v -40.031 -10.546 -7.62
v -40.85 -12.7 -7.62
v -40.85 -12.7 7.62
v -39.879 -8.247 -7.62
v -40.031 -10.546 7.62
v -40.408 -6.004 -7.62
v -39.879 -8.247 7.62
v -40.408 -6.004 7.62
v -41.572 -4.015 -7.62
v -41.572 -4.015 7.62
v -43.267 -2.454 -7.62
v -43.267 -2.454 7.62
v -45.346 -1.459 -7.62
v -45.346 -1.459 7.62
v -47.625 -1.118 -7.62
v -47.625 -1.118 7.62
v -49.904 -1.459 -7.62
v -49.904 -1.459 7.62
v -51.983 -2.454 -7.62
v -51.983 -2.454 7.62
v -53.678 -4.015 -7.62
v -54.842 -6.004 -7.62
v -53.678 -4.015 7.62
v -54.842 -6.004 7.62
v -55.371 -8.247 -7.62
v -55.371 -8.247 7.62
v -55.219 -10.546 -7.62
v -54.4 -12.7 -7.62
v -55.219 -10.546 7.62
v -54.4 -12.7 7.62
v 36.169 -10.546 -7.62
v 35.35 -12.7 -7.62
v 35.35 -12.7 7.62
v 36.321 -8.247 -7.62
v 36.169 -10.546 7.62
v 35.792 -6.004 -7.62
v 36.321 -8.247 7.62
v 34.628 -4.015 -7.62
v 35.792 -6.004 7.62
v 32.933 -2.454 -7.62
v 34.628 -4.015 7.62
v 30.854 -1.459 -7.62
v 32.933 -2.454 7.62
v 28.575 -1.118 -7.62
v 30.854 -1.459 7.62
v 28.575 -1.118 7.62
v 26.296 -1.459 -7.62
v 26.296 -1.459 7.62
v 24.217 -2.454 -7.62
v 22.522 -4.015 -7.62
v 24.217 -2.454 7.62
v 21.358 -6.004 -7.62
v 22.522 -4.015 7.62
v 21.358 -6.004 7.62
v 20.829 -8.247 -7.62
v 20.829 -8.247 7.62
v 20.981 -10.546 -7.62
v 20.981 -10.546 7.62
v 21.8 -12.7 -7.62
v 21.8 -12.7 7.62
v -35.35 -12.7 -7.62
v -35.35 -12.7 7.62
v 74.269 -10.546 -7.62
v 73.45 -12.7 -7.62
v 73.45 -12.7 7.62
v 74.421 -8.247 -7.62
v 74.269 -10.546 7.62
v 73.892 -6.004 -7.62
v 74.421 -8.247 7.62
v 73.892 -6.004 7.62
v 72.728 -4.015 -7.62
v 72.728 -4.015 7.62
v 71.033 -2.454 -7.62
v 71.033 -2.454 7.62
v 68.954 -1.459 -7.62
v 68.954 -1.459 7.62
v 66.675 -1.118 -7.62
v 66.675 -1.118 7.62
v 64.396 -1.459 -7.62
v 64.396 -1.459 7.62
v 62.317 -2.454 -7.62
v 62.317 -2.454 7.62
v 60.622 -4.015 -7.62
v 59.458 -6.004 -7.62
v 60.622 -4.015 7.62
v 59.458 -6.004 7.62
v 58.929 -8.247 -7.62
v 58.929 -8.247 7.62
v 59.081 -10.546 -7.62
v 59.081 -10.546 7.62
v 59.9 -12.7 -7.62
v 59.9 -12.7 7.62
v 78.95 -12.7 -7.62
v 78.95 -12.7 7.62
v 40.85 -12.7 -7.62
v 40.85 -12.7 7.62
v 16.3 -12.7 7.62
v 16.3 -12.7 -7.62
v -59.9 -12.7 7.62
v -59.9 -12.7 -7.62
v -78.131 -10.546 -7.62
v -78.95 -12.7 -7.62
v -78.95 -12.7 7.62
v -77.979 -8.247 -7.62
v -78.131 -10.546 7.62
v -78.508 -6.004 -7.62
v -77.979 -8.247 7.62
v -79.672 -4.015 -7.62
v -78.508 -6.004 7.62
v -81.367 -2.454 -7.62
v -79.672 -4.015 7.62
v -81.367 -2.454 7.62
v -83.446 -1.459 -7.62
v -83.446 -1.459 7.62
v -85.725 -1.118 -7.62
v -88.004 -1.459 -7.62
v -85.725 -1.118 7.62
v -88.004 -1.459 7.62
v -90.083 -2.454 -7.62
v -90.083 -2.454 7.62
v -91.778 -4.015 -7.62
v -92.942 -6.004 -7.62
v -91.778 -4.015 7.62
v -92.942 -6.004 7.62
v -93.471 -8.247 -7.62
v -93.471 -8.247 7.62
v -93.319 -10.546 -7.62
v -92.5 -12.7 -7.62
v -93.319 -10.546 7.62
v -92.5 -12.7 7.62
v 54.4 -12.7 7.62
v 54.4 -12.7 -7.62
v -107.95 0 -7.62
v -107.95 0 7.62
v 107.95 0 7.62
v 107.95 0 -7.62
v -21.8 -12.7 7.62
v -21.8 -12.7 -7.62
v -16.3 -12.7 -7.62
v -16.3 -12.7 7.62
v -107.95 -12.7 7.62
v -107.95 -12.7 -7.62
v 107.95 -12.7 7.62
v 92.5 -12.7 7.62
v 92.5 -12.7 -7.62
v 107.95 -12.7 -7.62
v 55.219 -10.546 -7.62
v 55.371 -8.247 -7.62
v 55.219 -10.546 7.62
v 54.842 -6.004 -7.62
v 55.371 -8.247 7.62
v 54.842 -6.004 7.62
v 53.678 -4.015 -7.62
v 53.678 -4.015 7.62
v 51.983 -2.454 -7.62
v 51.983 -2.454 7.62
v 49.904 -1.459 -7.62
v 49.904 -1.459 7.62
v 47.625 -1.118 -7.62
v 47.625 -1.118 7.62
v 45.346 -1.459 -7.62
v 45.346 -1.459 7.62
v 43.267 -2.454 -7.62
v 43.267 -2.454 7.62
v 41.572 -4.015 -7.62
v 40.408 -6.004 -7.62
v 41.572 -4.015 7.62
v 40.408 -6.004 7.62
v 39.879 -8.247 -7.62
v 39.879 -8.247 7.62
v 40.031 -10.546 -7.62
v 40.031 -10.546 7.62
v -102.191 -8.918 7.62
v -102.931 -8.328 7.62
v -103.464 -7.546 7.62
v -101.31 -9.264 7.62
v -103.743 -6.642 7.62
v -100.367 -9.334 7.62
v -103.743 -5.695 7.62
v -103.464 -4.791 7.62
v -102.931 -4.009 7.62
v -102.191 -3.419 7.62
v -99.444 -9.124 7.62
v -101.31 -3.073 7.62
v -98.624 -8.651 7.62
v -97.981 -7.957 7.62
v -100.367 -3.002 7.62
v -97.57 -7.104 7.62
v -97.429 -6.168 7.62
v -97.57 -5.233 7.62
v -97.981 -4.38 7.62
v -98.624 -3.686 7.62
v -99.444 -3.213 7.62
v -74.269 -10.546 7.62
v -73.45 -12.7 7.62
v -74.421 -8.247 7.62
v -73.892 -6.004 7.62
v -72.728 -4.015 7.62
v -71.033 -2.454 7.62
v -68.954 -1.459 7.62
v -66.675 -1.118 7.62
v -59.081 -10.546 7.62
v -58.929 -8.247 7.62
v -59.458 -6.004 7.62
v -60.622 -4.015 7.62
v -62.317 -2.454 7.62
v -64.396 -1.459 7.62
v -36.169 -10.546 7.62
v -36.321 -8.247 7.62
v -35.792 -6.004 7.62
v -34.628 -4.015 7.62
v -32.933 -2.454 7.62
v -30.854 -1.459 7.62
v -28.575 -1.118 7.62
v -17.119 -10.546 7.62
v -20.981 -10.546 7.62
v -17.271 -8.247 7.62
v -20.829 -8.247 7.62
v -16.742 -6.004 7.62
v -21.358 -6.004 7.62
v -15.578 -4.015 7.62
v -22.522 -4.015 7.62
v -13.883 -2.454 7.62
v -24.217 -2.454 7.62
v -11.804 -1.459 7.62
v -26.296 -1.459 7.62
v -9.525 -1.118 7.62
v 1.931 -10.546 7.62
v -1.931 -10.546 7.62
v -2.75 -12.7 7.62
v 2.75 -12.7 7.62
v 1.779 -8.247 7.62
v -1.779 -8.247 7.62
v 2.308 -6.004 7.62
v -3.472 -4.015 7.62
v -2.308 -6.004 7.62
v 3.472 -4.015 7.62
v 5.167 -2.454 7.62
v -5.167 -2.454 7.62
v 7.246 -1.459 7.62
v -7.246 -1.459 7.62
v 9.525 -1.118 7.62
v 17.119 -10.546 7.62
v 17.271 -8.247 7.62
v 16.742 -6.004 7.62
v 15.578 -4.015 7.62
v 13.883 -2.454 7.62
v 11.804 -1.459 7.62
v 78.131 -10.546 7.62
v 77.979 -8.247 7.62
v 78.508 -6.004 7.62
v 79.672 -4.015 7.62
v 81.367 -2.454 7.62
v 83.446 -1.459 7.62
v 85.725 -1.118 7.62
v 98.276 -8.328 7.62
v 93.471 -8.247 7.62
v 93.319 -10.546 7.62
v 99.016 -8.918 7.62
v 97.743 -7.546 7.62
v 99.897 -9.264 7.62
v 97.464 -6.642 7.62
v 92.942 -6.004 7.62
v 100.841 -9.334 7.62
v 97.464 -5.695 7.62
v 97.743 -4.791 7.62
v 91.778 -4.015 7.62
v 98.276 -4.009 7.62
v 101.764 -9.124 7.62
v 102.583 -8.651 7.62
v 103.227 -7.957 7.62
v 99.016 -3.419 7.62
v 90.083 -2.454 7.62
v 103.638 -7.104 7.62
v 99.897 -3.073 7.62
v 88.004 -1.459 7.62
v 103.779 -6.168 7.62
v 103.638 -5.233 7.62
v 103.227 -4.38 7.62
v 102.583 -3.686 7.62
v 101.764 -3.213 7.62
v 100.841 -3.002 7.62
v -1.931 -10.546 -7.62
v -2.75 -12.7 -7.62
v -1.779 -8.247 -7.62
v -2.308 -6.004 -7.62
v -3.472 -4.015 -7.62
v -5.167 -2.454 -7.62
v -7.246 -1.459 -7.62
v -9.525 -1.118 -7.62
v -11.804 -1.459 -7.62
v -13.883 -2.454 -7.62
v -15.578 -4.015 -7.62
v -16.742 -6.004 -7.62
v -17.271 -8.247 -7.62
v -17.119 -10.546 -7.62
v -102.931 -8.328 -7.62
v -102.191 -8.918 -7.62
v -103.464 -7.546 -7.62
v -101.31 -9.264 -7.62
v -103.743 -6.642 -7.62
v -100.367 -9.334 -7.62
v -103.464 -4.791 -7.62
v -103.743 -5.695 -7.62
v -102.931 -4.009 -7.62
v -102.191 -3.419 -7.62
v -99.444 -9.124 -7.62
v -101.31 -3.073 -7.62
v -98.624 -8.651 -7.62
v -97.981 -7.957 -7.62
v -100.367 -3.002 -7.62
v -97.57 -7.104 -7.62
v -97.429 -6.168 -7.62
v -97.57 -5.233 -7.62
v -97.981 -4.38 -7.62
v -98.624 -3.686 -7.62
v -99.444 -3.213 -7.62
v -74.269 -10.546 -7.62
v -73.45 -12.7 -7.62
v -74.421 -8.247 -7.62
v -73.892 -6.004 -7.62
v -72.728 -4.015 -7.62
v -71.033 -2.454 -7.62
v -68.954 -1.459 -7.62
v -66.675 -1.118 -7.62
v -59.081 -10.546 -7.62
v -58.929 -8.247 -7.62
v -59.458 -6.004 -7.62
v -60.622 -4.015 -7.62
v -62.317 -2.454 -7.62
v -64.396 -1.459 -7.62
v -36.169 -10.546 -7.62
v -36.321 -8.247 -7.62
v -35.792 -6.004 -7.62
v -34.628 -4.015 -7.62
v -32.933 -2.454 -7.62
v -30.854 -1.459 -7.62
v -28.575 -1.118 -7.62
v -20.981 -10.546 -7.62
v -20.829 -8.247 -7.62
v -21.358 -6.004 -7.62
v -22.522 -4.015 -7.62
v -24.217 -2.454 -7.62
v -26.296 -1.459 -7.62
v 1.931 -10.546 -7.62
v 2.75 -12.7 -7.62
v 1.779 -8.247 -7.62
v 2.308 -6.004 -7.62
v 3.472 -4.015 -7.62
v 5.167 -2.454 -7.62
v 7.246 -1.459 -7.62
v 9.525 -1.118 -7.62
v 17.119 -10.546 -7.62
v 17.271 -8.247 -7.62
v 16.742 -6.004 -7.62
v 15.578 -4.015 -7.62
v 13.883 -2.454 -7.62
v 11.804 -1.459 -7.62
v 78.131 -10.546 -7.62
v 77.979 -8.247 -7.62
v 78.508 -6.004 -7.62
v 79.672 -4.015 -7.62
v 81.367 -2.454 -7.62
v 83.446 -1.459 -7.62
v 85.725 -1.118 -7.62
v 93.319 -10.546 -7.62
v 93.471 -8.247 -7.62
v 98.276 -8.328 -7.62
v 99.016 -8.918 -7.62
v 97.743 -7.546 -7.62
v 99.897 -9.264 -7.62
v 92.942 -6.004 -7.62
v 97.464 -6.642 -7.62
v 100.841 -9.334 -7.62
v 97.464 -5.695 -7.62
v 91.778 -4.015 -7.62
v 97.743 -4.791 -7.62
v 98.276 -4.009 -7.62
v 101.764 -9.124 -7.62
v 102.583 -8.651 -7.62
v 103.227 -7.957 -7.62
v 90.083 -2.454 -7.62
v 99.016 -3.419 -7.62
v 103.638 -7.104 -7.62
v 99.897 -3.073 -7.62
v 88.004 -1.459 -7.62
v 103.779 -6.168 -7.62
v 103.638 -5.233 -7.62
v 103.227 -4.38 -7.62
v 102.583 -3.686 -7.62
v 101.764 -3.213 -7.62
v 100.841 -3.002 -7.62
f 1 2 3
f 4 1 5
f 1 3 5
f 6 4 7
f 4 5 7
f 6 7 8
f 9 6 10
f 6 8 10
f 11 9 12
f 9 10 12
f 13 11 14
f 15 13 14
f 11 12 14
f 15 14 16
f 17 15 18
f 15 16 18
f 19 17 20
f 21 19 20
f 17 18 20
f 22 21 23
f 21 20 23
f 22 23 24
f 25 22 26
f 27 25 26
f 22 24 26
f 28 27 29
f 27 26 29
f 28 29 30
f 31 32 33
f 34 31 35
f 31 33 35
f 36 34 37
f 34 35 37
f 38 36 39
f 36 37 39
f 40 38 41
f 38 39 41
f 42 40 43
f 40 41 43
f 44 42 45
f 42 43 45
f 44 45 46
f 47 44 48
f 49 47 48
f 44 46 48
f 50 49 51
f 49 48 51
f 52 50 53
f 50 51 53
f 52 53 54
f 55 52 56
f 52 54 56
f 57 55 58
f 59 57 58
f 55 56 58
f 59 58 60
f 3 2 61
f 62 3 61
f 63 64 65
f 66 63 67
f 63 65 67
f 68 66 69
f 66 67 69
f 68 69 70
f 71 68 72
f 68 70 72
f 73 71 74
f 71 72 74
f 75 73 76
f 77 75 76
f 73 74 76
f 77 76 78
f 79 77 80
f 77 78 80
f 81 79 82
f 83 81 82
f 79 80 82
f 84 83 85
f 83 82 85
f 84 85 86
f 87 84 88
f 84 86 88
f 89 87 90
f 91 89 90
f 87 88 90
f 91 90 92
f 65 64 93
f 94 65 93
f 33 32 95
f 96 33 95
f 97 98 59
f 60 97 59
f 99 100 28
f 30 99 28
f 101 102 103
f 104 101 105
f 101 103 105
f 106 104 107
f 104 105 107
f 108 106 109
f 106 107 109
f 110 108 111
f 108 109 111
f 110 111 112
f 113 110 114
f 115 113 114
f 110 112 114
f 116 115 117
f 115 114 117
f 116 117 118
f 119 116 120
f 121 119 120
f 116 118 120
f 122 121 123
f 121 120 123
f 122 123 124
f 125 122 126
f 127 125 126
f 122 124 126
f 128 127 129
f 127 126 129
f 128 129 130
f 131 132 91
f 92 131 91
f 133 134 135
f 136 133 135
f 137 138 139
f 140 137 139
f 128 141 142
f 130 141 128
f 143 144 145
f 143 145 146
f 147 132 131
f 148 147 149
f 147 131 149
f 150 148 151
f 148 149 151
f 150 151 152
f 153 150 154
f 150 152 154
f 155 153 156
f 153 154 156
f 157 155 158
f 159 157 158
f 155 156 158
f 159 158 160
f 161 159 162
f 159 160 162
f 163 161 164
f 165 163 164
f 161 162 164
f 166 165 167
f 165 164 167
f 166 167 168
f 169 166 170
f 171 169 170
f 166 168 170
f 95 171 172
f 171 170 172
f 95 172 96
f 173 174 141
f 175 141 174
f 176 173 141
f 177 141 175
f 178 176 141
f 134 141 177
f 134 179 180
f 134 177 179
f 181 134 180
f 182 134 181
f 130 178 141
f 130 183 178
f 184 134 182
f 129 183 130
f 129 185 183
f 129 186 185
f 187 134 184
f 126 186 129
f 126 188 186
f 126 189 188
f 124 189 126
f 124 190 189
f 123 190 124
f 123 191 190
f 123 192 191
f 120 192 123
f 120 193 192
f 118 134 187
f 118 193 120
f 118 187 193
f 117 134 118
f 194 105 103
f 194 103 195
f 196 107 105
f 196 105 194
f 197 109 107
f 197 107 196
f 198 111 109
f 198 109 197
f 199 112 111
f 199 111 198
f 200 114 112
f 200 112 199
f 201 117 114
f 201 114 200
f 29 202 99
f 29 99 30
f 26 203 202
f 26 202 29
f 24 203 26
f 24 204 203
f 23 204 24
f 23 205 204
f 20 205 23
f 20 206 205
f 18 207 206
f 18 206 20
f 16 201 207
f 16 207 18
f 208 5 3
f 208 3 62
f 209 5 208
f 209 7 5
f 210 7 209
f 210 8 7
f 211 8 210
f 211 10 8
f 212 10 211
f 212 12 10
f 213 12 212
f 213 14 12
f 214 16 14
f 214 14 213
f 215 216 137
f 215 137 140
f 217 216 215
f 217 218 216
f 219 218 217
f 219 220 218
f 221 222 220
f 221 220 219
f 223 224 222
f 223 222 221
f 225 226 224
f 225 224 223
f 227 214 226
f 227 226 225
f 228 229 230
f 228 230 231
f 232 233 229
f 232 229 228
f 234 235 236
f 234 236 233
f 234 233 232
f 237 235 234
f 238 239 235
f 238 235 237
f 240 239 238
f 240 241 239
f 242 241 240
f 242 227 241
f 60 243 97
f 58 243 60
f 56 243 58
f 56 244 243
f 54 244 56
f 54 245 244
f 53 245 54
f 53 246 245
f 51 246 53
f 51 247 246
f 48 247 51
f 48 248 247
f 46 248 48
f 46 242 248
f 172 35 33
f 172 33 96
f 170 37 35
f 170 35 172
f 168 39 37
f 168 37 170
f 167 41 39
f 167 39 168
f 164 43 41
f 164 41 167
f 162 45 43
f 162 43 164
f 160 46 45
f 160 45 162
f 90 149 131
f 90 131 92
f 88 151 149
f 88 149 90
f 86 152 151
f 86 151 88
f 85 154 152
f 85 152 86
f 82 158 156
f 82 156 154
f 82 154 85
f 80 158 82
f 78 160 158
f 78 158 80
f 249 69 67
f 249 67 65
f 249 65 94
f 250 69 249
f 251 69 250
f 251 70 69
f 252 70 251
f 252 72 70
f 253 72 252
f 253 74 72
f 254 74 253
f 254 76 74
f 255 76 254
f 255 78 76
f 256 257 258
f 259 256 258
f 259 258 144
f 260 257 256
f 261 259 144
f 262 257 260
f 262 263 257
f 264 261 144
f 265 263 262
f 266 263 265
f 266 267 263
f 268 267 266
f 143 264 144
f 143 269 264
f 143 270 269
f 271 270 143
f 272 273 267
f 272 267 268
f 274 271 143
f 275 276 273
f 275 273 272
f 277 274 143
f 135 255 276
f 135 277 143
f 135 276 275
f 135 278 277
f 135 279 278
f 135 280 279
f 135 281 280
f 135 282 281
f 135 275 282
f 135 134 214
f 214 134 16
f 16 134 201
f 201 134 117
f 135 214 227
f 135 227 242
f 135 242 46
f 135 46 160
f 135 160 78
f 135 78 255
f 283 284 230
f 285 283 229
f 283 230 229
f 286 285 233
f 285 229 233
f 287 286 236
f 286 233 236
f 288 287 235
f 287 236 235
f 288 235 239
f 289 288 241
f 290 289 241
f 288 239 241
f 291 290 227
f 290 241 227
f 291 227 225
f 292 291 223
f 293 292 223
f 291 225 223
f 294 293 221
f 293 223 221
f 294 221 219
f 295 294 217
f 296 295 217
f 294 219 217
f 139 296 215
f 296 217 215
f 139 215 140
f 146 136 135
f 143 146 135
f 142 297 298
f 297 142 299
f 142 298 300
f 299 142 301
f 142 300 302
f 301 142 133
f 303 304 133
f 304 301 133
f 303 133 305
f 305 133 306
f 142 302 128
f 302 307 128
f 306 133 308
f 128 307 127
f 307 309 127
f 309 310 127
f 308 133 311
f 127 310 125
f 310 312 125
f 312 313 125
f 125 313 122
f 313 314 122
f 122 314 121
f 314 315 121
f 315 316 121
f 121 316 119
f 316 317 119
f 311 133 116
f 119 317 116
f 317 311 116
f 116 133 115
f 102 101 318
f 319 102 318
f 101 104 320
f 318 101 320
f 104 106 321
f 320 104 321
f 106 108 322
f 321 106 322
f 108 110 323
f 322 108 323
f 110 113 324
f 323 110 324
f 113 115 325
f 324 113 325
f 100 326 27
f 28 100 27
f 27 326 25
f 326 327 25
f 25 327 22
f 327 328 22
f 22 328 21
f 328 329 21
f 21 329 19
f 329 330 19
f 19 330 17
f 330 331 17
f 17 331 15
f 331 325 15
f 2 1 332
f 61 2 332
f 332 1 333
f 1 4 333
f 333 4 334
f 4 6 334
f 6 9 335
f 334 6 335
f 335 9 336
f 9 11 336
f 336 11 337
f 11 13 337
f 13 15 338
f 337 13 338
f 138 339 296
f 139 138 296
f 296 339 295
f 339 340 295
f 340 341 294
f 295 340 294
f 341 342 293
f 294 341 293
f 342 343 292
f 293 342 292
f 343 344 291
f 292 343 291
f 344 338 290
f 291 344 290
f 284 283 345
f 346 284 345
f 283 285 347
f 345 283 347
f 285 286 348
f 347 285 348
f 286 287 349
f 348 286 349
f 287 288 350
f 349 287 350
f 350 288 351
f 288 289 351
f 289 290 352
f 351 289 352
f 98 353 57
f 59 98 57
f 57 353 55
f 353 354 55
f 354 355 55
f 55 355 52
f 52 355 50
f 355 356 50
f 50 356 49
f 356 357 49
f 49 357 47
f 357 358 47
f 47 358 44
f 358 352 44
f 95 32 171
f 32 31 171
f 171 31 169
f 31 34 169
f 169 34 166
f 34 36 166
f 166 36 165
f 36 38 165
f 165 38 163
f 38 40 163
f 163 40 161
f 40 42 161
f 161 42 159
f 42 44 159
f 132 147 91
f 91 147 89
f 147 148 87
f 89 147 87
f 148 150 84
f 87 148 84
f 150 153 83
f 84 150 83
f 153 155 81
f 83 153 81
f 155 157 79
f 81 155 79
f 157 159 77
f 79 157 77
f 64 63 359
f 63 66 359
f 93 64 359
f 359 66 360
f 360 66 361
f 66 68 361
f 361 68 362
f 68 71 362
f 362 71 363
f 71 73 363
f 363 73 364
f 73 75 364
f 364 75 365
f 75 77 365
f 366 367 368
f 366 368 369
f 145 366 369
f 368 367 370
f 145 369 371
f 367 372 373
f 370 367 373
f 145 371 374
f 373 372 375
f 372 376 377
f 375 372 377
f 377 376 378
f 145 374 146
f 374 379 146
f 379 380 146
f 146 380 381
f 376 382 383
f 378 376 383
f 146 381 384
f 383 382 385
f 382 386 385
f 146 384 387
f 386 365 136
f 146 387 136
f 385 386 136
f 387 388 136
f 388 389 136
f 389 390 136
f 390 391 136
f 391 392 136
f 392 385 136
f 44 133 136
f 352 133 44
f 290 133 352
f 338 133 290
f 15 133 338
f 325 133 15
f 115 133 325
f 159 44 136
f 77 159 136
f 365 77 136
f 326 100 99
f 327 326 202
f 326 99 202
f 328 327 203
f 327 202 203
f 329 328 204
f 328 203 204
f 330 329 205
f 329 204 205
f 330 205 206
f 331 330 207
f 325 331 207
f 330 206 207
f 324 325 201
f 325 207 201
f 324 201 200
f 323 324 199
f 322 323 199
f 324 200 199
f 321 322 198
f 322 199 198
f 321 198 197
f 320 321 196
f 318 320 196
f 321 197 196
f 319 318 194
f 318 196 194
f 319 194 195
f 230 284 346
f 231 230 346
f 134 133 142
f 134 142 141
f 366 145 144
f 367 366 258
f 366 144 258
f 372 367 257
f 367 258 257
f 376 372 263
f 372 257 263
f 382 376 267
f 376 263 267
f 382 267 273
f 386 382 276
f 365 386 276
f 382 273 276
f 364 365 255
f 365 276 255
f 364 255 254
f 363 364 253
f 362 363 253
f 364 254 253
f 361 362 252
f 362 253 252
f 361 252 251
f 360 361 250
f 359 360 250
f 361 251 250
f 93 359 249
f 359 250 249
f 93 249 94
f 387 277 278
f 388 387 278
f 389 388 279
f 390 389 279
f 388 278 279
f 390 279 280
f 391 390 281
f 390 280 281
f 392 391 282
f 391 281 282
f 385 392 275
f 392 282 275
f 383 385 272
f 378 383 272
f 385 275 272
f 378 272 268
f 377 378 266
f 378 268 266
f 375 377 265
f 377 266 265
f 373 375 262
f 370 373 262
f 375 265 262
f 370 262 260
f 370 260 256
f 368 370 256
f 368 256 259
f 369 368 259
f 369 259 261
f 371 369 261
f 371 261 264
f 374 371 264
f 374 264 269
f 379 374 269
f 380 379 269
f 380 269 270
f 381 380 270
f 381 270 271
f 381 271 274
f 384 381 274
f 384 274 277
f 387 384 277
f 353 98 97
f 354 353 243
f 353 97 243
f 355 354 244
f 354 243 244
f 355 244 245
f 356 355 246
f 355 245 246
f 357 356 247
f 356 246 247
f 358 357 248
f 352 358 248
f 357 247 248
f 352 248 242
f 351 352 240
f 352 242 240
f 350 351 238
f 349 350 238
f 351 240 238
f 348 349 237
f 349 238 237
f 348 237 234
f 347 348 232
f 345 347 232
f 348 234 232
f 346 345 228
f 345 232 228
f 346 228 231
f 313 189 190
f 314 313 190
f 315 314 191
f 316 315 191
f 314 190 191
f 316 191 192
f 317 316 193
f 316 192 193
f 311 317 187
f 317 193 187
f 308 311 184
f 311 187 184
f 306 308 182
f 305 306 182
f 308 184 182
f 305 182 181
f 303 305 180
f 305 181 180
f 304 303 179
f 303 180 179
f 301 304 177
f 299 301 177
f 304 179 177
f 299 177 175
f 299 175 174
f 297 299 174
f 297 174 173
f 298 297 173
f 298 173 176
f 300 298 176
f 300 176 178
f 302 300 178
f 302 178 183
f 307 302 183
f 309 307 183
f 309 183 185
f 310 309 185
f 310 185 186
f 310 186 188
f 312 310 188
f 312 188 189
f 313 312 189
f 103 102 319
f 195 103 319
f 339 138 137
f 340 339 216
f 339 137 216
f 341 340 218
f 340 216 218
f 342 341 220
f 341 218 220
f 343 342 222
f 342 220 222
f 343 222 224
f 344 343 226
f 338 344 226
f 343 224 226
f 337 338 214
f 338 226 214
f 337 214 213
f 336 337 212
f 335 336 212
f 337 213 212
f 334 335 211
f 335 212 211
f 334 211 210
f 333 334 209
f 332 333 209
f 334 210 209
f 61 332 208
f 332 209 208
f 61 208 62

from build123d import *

# Parameters (mm, degrees)
F0_W     = 215.9
F0_H     = 15.24
F1_DEPTH = 12.7
F2_R     = 7.7724
F3_DEPTH = 15.24
F4_R     = 3.175
F5_DEPTH = 15.241


with BuildPart() as f1:
    # F0 (on Front) → F1 (new body)
    with BuildSketch(Plane.XZ):
        Rectangle(F0_W, F0_H)
    extrude(amount=F1_DEPTH)

    # F2 (on face) → F3 (cut)
    with BuildSketch(Plane.XY.offset(7.62)):
        with Locations((-85.725, -8.89)):
            Circle(F2_R)
        with Locations((-66.675, -8.89)):
            Circle(F2_R)
        with Locations((-47.625, -8.89)):
            Circle(F2_R)
        with Locations((-28.575, -8.89)):
            Circle(F2_R)
        with Locations((-9.525, -8.89)):
            Circle(F2_R)
        with Locations((9.525, -8.89)):
            Circle(F2_R)
        with Locations((28.575, -8.89)):
            Circle(F2_R)
        with Locations((47.625, -8.89)):
            Circle(F2_R)
        with Locations((66.675, -8.89)):
            Circle(F2_R)
        with Locations((85.725, -8.89)):
            Circle(F2_R)
    extrude(amount=-F3_DEPTH, mode=Mode.SUBTRACT)

    # F4 (on face) → F5 (cut, through all)
    with BuildSketch(Plane.XY.offset(7.62)):
        with Locations((-100.603828, -6.168369)):
            Circle(F4_R)
        with Locations((100.603828, -6.168369)):
            Circle(F4_R)
    extrude(amount=-F5_DEPTH, mode=Mode.SUBTRACT)


solid = f1.part
